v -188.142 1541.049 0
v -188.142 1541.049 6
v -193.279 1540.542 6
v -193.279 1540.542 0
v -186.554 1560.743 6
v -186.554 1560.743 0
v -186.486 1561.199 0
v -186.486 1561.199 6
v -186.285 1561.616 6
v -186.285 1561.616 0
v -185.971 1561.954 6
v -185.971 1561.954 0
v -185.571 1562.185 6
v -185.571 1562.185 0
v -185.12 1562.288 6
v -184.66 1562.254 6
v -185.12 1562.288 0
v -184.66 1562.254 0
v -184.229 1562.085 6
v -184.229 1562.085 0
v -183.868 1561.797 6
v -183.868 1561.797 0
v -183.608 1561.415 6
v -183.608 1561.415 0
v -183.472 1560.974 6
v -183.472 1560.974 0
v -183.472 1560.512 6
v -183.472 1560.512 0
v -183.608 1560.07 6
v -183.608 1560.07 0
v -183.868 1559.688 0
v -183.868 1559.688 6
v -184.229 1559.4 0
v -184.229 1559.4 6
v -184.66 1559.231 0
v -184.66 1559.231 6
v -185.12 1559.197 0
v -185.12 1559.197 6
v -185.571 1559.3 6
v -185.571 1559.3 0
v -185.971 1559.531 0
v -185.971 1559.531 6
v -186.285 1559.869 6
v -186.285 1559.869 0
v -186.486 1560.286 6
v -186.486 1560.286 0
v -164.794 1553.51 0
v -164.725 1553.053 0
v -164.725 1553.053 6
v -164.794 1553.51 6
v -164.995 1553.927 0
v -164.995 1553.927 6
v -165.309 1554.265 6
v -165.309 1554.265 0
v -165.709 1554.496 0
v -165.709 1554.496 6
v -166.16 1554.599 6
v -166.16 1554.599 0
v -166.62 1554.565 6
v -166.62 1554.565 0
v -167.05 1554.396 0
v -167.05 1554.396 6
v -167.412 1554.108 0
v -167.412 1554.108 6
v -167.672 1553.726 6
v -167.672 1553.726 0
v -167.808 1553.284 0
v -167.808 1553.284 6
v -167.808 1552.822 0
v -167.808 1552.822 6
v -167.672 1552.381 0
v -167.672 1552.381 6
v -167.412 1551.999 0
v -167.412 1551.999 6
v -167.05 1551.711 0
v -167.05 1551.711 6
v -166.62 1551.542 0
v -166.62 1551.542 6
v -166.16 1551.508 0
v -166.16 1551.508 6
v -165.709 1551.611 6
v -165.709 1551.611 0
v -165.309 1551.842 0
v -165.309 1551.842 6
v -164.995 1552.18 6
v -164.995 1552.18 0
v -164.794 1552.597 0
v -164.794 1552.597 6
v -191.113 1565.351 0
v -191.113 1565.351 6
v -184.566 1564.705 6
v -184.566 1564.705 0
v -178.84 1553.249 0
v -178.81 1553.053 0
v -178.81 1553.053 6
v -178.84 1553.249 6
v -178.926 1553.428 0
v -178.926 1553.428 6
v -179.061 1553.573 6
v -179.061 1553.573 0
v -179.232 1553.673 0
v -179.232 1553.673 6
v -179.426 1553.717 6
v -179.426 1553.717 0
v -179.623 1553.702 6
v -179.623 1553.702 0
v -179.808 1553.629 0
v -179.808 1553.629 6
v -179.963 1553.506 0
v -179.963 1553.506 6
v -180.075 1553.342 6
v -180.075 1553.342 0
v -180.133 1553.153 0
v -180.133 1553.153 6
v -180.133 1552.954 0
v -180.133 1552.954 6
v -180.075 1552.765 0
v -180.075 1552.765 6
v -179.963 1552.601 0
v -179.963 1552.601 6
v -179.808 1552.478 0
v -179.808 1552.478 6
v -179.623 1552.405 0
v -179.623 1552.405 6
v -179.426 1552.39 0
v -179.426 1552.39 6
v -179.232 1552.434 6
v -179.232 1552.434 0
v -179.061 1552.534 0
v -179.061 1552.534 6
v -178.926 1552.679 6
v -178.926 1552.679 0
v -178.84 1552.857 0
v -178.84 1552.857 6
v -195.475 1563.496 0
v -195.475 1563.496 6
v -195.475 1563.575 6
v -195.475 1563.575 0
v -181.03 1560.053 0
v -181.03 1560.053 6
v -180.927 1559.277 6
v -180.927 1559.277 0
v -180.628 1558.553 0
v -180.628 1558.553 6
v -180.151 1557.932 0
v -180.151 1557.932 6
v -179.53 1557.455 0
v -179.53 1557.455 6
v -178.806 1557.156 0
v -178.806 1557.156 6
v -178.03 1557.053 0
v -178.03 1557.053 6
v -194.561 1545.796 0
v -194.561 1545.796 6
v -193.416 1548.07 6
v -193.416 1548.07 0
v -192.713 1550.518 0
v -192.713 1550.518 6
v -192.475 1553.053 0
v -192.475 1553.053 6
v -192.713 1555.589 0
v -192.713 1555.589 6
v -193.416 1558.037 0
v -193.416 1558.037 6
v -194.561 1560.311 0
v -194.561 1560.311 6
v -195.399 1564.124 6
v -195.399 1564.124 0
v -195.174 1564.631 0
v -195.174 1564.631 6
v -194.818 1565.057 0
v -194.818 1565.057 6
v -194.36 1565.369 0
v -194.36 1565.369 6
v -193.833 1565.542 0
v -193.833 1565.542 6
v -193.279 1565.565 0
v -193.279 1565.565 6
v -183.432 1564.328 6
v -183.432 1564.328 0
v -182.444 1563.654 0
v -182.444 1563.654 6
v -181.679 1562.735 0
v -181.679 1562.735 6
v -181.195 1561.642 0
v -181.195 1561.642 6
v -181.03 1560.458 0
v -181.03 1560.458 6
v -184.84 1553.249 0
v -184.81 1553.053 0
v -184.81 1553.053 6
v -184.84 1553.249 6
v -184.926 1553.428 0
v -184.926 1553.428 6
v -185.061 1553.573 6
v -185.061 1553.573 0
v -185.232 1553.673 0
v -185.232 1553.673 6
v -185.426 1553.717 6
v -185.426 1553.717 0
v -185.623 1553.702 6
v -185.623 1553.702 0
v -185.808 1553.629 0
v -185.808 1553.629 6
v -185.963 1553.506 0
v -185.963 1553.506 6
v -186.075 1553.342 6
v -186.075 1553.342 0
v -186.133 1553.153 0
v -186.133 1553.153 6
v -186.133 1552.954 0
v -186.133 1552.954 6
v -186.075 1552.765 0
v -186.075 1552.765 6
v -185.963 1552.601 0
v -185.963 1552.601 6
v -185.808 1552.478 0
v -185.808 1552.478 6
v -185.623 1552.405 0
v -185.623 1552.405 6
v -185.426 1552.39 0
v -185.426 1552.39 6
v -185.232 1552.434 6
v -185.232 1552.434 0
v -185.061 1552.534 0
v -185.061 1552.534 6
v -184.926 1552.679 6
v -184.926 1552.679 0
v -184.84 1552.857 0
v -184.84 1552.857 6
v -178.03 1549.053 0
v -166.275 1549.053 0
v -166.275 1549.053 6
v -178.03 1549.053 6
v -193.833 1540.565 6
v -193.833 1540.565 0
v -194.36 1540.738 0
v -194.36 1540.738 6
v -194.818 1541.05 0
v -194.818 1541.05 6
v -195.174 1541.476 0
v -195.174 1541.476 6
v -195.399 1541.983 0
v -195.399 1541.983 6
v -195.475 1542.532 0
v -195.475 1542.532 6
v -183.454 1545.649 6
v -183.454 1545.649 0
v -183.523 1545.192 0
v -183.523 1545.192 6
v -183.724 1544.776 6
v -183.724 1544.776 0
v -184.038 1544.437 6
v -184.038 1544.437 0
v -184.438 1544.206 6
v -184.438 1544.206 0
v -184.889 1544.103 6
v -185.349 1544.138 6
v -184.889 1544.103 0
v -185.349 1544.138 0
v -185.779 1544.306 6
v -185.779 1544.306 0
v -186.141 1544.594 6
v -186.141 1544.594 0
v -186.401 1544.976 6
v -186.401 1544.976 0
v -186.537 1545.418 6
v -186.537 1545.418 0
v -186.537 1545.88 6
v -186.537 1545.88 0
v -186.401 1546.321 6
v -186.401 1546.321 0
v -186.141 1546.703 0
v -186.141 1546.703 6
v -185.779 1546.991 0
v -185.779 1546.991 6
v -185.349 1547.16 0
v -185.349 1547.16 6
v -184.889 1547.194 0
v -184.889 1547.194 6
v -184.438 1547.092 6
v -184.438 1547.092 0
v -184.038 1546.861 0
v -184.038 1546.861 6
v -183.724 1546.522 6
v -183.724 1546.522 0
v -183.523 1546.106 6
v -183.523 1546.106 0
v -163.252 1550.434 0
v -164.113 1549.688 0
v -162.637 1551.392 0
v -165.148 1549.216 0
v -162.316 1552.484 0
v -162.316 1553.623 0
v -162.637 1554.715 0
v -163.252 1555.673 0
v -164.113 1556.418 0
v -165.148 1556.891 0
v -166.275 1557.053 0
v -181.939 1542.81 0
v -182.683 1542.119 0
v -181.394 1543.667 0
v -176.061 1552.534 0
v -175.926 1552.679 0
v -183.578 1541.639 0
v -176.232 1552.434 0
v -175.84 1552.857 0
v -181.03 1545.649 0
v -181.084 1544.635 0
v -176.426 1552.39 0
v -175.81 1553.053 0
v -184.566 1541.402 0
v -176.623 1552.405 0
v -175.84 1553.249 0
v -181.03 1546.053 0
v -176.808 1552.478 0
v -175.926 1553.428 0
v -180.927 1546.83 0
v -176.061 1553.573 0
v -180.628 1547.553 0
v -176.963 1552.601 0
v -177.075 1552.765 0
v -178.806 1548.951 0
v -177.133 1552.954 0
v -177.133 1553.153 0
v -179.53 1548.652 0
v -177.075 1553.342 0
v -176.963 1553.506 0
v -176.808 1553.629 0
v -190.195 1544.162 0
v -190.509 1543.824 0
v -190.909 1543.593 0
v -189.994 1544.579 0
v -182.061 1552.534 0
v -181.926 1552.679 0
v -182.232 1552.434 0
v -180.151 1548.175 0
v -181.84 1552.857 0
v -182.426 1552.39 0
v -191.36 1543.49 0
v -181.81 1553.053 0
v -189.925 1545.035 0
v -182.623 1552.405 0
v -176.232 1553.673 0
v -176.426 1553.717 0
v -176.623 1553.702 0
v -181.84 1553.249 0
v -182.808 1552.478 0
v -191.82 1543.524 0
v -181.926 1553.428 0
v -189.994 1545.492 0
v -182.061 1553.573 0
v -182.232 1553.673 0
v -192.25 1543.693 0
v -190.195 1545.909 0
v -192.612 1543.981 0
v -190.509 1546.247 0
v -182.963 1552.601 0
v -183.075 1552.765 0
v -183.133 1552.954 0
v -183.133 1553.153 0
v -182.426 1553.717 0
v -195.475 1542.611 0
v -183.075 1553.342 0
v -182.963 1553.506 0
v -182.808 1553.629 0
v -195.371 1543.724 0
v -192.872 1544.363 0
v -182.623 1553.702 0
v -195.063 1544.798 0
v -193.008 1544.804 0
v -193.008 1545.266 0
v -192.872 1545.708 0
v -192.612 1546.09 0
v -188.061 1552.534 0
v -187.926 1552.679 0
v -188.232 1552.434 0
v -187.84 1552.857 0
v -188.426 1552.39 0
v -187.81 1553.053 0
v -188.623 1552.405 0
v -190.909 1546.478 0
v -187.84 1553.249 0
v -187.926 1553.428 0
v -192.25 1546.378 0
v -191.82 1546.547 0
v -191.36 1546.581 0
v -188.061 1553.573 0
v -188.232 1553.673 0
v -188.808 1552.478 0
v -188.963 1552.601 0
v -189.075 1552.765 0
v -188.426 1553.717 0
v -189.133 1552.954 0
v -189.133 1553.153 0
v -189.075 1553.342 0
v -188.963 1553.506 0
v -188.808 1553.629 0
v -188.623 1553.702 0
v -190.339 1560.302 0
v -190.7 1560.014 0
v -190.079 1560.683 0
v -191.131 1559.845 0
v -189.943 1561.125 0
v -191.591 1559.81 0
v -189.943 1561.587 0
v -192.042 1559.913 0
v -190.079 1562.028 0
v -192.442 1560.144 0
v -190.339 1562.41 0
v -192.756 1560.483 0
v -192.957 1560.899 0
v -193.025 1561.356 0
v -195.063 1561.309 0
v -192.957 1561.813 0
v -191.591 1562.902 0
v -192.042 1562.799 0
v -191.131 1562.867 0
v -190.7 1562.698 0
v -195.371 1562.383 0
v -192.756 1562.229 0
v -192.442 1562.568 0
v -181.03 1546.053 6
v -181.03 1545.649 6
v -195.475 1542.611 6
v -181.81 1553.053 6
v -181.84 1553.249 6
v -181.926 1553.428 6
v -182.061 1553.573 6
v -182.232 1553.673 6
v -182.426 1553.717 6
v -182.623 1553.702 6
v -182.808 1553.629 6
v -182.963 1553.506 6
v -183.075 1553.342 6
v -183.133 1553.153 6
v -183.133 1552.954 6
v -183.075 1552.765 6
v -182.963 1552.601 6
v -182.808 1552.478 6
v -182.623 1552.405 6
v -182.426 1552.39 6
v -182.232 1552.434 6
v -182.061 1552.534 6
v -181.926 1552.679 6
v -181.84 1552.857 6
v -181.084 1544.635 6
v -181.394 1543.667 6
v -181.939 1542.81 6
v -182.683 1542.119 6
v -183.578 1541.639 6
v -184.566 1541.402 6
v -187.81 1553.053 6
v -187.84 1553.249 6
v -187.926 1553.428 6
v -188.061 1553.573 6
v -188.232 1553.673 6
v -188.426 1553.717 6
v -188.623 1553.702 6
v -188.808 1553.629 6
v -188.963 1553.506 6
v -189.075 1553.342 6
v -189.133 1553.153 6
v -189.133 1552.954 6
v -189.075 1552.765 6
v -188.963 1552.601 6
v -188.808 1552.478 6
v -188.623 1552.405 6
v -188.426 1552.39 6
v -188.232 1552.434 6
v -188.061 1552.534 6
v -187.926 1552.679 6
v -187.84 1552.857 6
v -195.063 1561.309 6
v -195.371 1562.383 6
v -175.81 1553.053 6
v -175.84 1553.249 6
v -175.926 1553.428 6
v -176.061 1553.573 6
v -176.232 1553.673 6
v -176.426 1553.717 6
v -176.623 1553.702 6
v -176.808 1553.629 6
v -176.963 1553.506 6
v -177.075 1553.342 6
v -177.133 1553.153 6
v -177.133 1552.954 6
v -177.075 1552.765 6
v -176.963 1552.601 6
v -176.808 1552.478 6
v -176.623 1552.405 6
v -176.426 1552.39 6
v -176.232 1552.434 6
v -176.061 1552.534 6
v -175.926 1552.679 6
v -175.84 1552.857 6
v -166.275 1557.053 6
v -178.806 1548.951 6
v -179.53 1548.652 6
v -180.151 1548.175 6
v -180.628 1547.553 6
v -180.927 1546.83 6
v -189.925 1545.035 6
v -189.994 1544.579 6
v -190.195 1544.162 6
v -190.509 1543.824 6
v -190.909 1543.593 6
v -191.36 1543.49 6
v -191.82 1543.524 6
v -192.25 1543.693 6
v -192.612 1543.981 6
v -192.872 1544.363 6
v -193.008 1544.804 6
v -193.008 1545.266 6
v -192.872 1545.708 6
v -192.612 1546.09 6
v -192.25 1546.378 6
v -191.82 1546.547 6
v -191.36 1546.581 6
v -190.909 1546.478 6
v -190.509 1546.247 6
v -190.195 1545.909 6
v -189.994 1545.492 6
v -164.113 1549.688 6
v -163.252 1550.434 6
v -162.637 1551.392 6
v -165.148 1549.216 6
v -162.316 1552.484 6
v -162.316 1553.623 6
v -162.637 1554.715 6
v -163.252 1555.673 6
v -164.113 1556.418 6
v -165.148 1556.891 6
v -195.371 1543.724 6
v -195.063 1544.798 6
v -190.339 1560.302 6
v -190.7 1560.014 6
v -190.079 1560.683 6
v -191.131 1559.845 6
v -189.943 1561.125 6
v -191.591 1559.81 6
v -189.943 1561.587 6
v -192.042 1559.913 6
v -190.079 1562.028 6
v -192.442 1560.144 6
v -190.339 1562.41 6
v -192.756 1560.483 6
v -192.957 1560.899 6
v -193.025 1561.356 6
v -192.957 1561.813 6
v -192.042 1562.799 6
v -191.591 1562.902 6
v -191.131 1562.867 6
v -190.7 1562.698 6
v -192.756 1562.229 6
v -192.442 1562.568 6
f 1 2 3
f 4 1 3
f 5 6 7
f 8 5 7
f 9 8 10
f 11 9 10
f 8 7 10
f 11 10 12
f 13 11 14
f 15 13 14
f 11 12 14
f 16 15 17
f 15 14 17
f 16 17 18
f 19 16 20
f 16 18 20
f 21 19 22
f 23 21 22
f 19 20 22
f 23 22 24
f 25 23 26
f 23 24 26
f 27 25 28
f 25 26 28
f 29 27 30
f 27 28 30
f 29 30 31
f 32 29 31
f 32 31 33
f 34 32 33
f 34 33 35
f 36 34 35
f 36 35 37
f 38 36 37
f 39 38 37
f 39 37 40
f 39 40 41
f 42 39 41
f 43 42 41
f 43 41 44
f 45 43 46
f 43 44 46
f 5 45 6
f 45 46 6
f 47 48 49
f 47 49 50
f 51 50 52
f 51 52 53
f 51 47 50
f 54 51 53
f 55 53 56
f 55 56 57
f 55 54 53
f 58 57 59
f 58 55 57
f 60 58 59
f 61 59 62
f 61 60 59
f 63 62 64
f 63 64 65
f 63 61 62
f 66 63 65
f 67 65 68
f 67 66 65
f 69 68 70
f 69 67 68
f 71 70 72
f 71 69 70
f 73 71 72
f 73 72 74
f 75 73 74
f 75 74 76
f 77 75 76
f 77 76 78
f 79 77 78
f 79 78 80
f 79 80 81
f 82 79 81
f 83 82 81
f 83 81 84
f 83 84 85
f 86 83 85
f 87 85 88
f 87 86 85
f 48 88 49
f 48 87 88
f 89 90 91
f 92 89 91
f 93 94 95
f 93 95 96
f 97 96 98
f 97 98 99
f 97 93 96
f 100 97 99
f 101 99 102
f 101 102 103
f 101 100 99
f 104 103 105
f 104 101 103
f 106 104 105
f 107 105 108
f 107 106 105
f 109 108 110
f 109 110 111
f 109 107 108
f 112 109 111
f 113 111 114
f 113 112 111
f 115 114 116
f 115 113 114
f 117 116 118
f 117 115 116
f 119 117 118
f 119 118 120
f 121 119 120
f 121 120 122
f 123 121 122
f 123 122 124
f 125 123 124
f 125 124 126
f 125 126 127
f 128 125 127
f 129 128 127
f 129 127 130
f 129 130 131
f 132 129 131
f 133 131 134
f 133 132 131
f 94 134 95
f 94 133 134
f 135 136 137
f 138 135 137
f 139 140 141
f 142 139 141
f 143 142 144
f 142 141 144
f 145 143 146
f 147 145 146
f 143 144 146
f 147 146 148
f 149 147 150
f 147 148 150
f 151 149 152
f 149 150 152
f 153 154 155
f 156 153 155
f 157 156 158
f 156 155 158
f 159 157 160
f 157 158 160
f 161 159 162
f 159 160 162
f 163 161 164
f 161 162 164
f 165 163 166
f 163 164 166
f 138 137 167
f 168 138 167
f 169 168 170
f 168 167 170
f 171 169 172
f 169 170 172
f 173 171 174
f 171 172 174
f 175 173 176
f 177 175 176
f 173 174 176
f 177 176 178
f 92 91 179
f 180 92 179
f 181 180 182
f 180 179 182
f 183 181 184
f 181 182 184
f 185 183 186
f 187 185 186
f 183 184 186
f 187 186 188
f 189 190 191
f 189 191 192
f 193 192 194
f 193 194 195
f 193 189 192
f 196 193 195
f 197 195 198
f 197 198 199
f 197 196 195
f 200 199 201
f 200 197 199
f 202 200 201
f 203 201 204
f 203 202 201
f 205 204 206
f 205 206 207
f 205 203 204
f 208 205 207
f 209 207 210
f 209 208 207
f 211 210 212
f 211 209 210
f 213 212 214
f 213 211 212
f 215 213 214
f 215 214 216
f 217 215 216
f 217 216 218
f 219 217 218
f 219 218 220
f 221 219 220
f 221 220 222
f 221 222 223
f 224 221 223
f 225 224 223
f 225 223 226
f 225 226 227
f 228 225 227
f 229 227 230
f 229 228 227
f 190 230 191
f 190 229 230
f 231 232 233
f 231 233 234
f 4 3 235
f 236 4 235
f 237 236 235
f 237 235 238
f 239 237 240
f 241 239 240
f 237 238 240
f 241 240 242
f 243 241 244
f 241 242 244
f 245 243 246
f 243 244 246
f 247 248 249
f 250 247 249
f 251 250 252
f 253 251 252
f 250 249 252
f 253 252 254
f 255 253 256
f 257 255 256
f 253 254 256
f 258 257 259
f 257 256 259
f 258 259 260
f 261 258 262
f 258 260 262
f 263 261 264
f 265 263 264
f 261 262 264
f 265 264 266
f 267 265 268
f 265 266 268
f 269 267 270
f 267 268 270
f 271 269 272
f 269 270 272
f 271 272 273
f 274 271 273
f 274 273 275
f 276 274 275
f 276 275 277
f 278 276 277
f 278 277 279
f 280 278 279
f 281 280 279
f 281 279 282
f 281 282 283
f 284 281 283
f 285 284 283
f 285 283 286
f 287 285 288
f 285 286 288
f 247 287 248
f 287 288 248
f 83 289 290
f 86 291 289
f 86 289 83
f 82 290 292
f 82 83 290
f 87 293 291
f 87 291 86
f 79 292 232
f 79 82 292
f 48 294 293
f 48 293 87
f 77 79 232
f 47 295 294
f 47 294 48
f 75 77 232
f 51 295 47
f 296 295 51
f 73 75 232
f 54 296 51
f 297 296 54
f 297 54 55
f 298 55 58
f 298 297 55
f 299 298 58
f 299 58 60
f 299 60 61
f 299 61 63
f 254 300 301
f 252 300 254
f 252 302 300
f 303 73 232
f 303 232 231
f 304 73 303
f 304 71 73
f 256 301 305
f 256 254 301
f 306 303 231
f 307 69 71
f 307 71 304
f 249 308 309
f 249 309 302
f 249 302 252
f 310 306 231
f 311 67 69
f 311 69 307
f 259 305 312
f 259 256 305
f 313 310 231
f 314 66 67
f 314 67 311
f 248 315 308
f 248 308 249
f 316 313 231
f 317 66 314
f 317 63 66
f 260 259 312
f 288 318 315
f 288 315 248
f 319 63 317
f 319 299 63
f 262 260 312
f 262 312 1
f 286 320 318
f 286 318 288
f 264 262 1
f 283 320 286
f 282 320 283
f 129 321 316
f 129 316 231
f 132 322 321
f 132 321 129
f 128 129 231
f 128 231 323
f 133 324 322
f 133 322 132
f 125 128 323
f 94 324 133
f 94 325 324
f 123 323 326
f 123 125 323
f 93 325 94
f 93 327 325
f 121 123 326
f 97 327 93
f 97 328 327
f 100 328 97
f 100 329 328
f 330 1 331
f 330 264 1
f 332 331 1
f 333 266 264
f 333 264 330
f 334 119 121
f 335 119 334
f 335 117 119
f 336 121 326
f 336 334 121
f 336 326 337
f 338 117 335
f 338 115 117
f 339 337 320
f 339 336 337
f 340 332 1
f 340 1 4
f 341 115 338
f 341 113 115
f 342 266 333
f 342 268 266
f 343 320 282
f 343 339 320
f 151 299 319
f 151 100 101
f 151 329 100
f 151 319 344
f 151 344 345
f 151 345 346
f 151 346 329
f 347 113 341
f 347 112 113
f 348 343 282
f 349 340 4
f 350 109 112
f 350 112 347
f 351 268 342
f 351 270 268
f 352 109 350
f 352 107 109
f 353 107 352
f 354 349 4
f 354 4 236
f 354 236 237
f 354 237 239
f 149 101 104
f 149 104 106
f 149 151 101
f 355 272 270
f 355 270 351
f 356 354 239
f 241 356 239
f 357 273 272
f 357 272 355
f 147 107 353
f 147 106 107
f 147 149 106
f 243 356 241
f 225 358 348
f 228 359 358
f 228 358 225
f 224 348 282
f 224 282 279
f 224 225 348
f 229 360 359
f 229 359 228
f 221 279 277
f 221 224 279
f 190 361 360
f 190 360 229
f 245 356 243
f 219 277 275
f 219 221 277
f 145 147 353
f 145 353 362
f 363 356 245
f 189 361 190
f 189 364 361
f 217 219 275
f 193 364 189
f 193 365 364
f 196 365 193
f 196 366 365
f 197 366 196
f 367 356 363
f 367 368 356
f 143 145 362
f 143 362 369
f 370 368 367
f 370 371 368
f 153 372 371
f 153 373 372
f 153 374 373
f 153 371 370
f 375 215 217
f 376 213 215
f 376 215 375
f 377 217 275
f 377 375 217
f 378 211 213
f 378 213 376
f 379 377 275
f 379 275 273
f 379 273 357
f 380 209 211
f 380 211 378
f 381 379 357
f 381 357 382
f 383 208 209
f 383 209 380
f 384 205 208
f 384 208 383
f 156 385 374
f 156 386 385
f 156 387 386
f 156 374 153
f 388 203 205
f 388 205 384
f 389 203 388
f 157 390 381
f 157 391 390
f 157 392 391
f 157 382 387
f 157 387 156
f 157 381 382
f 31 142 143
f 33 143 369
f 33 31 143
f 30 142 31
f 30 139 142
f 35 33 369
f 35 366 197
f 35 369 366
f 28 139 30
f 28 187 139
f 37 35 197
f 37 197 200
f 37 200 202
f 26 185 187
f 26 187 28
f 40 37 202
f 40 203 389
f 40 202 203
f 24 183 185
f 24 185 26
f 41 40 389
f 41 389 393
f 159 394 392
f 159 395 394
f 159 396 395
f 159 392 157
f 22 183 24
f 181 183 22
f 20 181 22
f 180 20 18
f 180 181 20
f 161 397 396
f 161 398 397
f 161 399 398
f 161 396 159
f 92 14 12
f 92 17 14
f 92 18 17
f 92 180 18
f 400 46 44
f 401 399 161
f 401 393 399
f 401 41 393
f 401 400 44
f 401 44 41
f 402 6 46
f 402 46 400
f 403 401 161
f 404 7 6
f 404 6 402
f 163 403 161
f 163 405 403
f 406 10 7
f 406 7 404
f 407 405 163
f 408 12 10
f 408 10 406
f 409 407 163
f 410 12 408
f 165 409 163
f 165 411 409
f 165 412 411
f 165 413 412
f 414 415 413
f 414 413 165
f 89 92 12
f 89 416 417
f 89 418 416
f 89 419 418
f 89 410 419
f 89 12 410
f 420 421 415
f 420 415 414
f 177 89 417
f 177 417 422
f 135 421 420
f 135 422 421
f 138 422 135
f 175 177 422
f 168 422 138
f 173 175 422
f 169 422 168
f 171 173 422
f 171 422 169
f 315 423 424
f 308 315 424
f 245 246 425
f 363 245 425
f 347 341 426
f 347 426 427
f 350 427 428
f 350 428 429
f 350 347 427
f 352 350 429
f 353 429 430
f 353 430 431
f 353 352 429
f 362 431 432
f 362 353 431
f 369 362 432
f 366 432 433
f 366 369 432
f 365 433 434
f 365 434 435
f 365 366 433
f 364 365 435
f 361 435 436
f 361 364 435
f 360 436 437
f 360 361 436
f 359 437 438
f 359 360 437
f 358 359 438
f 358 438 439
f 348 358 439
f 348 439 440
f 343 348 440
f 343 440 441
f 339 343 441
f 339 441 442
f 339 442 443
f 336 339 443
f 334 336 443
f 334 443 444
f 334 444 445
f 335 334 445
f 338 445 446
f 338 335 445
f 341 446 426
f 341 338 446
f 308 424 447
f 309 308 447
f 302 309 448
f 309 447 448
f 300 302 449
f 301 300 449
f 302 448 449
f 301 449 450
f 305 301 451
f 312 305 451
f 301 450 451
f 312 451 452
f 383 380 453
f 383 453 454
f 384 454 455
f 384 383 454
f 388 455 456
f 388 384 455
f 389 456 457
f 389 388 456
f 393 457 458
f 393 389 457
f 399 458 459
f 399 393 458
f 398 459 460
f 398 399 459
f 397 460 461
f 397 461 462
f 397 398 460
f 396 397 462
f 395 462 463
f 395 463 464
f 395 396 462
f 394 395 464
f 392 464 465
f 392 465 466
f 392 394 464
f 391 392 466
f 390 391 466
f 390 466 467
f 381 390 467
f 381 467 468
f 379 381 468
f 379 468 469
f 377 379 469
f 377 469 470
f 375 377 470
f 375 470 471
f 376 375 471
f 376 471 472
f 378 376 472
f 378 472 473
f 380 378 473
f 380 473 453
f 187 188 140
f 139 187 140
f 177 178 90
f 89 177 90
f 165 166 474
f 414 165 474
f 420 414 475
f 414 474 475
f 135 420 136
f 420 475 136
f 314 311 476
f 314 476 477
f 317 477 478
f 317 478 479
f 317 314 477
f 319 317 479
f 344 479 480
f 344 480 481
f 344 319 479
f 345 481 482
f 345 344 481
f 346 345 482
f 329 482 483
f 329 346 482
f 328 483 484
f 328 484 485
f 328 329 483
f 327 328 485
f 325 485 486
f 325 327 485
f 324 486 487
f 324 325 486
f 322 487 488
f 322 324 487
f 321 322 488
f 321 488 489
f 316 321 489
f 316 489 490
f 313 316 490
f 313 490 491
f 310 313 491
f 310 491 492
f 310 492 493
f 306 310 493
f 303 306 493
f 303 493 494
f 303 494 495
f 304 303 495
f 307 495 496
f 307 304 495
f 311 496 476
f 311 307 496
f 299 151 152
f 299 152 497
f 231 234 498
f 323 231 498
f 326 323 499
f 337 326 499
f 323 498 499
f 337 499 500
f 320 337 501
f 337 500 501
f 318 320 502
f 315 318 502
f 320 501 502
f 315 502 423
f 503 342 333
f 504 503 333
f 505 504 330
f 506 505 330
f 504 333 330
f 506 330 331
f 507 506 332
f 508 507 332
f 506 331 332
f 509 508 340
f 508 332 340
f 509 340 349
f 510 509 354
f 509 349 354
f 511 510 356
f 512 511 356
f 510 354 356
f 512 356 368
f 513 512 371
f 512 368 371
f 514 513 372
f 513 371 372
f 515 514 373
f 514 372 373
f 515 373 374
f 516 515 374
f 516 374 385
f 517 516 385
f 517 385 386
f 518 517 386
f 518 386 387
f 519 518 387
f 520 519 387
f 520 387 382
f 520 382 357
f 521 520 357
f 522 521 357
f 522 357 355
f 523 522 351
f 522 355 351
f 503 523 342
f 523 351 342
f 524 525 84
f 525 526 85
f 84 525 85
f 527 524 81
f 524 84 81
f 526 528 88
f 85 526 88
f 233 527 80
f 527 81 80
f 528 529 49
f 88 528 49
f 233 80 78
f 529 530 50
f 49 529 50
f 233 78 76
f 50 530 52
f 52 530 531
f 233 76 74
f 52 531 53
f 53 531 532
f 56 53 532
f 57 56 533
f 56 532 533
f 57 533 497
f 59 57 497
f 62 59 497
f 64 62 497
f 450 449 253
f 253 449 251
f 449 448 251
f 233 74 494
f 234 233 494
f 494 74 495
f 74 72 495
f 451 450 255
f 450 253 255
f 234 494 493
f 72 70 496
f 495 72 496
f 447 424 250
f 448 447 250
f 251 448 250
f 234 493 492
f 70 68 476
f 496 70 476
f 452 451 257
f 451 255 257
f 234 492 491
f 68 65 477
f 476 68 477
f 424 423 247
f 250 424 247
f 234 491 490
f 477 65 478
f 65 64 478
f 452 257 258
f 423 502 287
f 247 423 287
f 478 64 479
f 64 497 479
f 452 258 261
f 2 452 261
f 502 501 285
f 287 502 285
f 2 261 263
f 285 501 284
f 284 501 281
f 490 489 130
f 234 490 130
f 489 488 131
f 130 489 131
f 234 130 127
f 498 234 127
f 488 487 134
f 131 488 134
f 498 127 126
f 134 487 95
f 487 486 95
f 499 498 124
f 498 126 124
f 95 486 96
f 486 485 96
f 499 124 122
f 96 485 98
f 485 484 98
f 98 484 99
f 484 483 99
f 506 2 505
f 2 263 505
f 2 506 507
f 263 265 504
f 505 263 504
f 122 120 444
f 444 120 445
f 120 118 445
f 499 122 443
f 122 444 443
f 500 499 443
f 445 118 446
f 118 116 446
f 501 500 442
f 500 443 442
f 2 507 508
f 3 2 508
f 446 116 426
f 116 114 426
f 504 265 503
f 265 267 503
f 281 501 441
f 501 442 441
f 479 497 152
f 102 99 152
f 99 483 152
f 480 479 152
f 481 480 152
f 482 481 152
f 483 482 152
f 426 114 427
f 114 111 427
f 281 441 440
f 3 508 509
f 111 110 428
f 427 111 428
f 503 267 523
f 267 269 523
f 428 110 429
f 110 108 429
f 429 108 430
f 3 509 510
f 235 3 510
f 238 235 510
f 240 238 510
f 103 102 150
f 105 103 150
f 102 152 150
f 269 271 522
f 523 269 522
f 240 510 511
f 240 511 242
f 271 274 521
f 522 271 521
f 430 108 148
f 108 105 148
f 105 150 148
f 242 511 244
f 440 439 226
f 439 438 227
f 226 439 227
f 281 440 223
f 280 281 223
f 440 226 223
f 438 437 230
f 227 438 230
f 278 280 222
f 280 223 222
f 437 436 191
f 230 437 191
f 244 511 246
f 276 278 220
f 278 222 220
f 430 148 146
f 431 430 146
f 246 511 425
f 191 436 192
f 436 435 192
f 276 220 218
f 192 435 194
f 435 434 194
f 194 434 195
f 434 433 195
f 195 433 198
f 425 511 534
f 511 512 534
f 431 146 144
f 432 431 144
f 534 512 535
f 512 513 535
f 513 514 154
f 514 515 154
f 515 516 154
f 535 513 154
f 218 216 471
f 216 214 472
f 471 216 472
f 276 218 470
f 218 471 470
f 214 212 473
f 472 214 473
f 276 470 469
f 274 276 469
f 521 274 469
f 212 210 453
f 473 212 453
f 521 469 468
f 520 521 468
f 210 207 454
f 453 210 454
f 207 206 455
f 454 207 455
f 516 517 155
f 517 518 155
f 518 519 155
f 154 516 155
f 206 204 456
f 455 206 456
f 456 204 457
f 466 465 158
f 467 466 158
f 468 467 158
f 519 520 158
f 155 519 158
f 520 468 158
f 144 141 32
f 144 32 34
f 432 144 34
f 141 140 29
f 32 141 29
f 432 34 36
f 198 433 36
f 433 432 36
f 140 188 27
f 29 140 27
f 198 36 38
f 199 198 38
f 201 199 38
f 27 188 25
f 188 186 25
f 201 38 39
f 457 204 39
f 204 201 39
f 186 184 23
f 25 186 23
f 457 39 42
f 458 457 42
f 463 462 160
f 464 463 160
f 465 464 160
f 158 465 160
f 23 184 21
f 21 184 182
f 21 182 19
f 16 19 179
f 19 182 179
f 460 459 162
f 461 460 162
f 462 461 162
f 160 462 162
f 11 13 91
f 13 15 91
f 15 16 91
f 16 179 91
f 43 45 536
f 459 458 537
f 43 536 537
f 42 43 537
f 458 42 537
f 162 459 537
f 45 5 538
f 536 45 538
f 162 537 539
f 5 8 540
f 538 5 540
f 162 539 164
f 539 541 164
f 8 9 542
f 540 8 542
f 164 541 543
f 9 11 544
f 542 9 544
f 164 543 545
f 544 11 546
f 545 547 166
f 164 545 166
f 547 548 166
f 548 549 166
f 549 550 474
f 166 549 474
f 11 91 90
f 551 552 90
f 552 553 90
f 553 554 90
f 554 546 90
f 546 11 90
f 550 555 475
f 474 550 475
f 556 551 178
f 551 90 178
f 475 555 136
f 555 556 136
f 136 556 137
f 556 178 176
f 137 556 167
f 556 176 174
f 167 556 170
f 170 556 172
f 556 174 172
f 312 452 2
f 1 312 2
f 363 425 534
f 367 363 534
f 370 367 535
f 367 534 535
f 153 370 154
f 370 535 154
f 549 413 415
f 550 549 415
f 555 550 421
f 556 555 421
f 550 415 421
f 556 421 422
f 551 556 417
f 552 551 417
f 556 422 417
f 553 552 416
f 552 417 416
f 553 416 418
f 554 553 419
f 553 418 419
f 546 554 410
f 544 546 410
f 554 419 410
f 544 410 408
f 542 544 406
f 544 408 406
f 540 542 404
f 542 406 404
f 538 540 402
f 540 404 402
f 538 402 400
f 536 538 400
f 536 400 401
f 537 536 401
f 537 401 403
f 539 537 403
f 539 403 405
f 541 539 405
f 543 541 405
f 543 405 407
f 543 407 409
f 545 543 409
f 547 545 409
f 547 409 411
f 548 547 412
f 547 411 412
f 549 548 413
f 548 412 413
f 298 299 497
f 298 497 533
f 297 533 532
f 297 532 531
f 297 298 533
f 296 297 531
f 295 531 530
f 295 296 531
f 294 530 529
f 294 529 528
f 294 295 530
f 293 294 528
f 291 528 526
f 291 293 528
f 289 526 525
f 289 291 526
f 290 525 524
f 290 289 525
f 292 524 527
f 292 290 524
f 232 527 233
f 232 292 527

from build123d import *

# Parameters (mm, degrees)
SZKIC1_R                    = 1.55
DODANIE_WYCI_GNI_CIE1_DEPTH = 6
DODANIE_WYCI_GNI_CIE2_DEPTH = 6
WYTNIJ_WYCI_GNI_CIE3_START  = -10
SZKIC2_R                    = 0.665
SZKIC2_R_2                  = 1.55
WYTNIJ_WYCI_GNI_CIE3_DEPTH  = 10
SZYK_LINIOWY1_OUTLINE_R     = 0.665
SZYK_LINIOWY1_DEPTH         = 6
SZKIC6_R                    = 1.55
WYTNIJ_WYCI_GNI_CIE6_DEPTH  = 6


# Read off the part's stored shape, not the designer's step: Szyk liniowy1
with BuildPart() as part:
    # Szkic1 → Dodanie-wyciągnięcie1 (new body)
    with BuildSketch(Plane.XY):
        with BuildLine():
            Line((-166.275426397, 1549.053482816), (-188.475426397, 1549.053482816))
            ThreePointArc((-188.475426397, 1549.053482816), (-192.475426397, 1553.053482816), (-188.475426397, 1557.053482816))
            Line((-188.475426397, 1557.053482816), (-166.275426397, 1557.053482816))
            ThreePointArc((-166.275426397, 1557.053482816), (-162.275426397, 1553.053482816), (-166.275426397, 1549.053482816))
        make_face()
        with Locations((-166.275426397, 1553.053482816)):
            Circle(SZKIC1_R, mode=Mode.SUBTRACT)
    extrude(amount=DODANIE_WYCI_GNI_CIE1_DEPTH)

    # Szkic5 → Dodanie-wyciągnięcie2 (add)
    with BuildSketch(Plane.XY.offset(6)):
        with BuildLine():
            Line((-195.475426397, 1563.495915282), (-195.475426397, 1563.574683951))
            ThreePointArc((-195.475426397, 1563.574683951), (-194.81837577, 1565.056738938), (-193.278939414, 1565.565008766))
            Line((-193.278939414, 1565.565008766), (-191.112699272, 1565.351155235))
            Line((-191.112699272, 1565.351155235), (-184.565954248, 1564.704853604))
            ThreePointArc((-184.565954248, 1564.704853604), (-182.02952048, 1563.221328031), (-181.029706775, 1560.458228876))
            Line((-181.029706775, 1560.458228876), (-181.029706775, 1560.053482816))
            ThreePointArc((-181.029706775, 1560.053482816), (-180.151027119, 1557.932162472), (-178.029706775, 1557.053482816))
            Line((-178.029706775, 1557.053482816), (-178.029706775, 1549.053482816))
            ThreePointArc((-178.029706775, 1549.053482816), (-180.151027119, 1548.174803159), (-181.029706775, 1546.053482816))
            Line((-181.029706775, 1546.053482816), (-181.029706775, 1545.648736756))
            ThreePointArc((-181.029706775, 1545.648736756), (-181.939081075, 1542.810326939), (-184.565954248, 1541.402112028))
            Line((-184.565954248, 1541.402112028), (-188.141654627, 1541.049115084))
            Line((-188.141654627, 1541.049115084), (-193.278939414, 1540.541956866))
            ThreePointArc((-193.278939414, 1540.541956866), (-194.81837577, 1541.050226694), (-195.475426397, 1542.53228168))
            Line((-195.475426397, 1542.53228168), (-195.475426397, 1542.61105035))
            ThreePointArc((-195.475426397, 1542.61105035), (-195.242164639, 1544.267773032), (-194.560516381, 1545.795679033))
            ThreePointArc((-194.560516381, 1545.795679033), (-192.475426397, 1553.053482816), (-194.560516381, 1560.311286599))
            ThreePointArc((-194.560516381, 1560.311286599), (-195.242164639, 1561.839192599), (-195.475426397, 1563.495915282))
        make_face()
    extrude(amount=-DODANIE_WYCI_GNI_CIE2_DEPTH)

    # Szkic2 → Wytnij-wyciągnięcie3 (cut)
    with BuildSketch(Plane.XY.offset(6).offset(WYTNIJ_WYCI_GNI_CIE3_START)):
        with Locations((-188.475426397, 1553.053482816)):
            Circle(SZKIC2_R)
        with Locations((-166.275426397, 1553.053482816)):
            Circle(SZKIC2_R_2)
    extrude(amount=WYTNIJ_WYCI_GNI_CIE3_DEPTH, mode=Mode.SUBTRACT)

    # Szyk liniowy1 outline → Szyk liniowy1 (cut)
    with BuildSketch(Plane.XY):
        with Locations((-185.475426397, 1553.053482816)):
            Circle(SZYK_LINIOWY1_OUTLINE_R)
        with Locations((-182.475426397, 1553.053482816)):
            Circle(SZYK_LINIOWY1_OUTLINE_R)
        with Locations((-179.475426397, 1553.053482816)):
            Circle(SZYK_LINIOWY1_OUTLINE_R)
        with Locations((-176.475426397, 1553.053482816)):
            Circle(SZYK_LINIOWY1_OUTLINE_R)
    extrude(amount=SZYK_LINIOWY1_DEPTH, mode=Mode.SUBTRACT)

    # Szkic6 → Wytnij-wyciągnięcie6 (cut)
    with BuildSketch(Plane(origin=(0, 0, 0), x_dir=(-1, 0, 0), z_dir=(0, 0, -1))):
        with Locations((185.004427547, 1560.742573003)):
            Circle(SZKIC6_R)
        with Locations((191.475426395, 1561.355903175)):
            Circle(SZKIC6_R)
        with Locations(Location((191.475426395, 1545.035406583, 0), (0, 0, 180))):
            Circle(SZKIC6_R)
        with Locations(Location((185.004427547, 1545.648736756, 0), (0, 0, 180))):
            Circle(SZKIC6_R)
    extrude(amount=-WYTNIJ_WYCI_GNI_CIE6_DEPTH, mode=Mode.SUBTRACT)


solid = part.part
